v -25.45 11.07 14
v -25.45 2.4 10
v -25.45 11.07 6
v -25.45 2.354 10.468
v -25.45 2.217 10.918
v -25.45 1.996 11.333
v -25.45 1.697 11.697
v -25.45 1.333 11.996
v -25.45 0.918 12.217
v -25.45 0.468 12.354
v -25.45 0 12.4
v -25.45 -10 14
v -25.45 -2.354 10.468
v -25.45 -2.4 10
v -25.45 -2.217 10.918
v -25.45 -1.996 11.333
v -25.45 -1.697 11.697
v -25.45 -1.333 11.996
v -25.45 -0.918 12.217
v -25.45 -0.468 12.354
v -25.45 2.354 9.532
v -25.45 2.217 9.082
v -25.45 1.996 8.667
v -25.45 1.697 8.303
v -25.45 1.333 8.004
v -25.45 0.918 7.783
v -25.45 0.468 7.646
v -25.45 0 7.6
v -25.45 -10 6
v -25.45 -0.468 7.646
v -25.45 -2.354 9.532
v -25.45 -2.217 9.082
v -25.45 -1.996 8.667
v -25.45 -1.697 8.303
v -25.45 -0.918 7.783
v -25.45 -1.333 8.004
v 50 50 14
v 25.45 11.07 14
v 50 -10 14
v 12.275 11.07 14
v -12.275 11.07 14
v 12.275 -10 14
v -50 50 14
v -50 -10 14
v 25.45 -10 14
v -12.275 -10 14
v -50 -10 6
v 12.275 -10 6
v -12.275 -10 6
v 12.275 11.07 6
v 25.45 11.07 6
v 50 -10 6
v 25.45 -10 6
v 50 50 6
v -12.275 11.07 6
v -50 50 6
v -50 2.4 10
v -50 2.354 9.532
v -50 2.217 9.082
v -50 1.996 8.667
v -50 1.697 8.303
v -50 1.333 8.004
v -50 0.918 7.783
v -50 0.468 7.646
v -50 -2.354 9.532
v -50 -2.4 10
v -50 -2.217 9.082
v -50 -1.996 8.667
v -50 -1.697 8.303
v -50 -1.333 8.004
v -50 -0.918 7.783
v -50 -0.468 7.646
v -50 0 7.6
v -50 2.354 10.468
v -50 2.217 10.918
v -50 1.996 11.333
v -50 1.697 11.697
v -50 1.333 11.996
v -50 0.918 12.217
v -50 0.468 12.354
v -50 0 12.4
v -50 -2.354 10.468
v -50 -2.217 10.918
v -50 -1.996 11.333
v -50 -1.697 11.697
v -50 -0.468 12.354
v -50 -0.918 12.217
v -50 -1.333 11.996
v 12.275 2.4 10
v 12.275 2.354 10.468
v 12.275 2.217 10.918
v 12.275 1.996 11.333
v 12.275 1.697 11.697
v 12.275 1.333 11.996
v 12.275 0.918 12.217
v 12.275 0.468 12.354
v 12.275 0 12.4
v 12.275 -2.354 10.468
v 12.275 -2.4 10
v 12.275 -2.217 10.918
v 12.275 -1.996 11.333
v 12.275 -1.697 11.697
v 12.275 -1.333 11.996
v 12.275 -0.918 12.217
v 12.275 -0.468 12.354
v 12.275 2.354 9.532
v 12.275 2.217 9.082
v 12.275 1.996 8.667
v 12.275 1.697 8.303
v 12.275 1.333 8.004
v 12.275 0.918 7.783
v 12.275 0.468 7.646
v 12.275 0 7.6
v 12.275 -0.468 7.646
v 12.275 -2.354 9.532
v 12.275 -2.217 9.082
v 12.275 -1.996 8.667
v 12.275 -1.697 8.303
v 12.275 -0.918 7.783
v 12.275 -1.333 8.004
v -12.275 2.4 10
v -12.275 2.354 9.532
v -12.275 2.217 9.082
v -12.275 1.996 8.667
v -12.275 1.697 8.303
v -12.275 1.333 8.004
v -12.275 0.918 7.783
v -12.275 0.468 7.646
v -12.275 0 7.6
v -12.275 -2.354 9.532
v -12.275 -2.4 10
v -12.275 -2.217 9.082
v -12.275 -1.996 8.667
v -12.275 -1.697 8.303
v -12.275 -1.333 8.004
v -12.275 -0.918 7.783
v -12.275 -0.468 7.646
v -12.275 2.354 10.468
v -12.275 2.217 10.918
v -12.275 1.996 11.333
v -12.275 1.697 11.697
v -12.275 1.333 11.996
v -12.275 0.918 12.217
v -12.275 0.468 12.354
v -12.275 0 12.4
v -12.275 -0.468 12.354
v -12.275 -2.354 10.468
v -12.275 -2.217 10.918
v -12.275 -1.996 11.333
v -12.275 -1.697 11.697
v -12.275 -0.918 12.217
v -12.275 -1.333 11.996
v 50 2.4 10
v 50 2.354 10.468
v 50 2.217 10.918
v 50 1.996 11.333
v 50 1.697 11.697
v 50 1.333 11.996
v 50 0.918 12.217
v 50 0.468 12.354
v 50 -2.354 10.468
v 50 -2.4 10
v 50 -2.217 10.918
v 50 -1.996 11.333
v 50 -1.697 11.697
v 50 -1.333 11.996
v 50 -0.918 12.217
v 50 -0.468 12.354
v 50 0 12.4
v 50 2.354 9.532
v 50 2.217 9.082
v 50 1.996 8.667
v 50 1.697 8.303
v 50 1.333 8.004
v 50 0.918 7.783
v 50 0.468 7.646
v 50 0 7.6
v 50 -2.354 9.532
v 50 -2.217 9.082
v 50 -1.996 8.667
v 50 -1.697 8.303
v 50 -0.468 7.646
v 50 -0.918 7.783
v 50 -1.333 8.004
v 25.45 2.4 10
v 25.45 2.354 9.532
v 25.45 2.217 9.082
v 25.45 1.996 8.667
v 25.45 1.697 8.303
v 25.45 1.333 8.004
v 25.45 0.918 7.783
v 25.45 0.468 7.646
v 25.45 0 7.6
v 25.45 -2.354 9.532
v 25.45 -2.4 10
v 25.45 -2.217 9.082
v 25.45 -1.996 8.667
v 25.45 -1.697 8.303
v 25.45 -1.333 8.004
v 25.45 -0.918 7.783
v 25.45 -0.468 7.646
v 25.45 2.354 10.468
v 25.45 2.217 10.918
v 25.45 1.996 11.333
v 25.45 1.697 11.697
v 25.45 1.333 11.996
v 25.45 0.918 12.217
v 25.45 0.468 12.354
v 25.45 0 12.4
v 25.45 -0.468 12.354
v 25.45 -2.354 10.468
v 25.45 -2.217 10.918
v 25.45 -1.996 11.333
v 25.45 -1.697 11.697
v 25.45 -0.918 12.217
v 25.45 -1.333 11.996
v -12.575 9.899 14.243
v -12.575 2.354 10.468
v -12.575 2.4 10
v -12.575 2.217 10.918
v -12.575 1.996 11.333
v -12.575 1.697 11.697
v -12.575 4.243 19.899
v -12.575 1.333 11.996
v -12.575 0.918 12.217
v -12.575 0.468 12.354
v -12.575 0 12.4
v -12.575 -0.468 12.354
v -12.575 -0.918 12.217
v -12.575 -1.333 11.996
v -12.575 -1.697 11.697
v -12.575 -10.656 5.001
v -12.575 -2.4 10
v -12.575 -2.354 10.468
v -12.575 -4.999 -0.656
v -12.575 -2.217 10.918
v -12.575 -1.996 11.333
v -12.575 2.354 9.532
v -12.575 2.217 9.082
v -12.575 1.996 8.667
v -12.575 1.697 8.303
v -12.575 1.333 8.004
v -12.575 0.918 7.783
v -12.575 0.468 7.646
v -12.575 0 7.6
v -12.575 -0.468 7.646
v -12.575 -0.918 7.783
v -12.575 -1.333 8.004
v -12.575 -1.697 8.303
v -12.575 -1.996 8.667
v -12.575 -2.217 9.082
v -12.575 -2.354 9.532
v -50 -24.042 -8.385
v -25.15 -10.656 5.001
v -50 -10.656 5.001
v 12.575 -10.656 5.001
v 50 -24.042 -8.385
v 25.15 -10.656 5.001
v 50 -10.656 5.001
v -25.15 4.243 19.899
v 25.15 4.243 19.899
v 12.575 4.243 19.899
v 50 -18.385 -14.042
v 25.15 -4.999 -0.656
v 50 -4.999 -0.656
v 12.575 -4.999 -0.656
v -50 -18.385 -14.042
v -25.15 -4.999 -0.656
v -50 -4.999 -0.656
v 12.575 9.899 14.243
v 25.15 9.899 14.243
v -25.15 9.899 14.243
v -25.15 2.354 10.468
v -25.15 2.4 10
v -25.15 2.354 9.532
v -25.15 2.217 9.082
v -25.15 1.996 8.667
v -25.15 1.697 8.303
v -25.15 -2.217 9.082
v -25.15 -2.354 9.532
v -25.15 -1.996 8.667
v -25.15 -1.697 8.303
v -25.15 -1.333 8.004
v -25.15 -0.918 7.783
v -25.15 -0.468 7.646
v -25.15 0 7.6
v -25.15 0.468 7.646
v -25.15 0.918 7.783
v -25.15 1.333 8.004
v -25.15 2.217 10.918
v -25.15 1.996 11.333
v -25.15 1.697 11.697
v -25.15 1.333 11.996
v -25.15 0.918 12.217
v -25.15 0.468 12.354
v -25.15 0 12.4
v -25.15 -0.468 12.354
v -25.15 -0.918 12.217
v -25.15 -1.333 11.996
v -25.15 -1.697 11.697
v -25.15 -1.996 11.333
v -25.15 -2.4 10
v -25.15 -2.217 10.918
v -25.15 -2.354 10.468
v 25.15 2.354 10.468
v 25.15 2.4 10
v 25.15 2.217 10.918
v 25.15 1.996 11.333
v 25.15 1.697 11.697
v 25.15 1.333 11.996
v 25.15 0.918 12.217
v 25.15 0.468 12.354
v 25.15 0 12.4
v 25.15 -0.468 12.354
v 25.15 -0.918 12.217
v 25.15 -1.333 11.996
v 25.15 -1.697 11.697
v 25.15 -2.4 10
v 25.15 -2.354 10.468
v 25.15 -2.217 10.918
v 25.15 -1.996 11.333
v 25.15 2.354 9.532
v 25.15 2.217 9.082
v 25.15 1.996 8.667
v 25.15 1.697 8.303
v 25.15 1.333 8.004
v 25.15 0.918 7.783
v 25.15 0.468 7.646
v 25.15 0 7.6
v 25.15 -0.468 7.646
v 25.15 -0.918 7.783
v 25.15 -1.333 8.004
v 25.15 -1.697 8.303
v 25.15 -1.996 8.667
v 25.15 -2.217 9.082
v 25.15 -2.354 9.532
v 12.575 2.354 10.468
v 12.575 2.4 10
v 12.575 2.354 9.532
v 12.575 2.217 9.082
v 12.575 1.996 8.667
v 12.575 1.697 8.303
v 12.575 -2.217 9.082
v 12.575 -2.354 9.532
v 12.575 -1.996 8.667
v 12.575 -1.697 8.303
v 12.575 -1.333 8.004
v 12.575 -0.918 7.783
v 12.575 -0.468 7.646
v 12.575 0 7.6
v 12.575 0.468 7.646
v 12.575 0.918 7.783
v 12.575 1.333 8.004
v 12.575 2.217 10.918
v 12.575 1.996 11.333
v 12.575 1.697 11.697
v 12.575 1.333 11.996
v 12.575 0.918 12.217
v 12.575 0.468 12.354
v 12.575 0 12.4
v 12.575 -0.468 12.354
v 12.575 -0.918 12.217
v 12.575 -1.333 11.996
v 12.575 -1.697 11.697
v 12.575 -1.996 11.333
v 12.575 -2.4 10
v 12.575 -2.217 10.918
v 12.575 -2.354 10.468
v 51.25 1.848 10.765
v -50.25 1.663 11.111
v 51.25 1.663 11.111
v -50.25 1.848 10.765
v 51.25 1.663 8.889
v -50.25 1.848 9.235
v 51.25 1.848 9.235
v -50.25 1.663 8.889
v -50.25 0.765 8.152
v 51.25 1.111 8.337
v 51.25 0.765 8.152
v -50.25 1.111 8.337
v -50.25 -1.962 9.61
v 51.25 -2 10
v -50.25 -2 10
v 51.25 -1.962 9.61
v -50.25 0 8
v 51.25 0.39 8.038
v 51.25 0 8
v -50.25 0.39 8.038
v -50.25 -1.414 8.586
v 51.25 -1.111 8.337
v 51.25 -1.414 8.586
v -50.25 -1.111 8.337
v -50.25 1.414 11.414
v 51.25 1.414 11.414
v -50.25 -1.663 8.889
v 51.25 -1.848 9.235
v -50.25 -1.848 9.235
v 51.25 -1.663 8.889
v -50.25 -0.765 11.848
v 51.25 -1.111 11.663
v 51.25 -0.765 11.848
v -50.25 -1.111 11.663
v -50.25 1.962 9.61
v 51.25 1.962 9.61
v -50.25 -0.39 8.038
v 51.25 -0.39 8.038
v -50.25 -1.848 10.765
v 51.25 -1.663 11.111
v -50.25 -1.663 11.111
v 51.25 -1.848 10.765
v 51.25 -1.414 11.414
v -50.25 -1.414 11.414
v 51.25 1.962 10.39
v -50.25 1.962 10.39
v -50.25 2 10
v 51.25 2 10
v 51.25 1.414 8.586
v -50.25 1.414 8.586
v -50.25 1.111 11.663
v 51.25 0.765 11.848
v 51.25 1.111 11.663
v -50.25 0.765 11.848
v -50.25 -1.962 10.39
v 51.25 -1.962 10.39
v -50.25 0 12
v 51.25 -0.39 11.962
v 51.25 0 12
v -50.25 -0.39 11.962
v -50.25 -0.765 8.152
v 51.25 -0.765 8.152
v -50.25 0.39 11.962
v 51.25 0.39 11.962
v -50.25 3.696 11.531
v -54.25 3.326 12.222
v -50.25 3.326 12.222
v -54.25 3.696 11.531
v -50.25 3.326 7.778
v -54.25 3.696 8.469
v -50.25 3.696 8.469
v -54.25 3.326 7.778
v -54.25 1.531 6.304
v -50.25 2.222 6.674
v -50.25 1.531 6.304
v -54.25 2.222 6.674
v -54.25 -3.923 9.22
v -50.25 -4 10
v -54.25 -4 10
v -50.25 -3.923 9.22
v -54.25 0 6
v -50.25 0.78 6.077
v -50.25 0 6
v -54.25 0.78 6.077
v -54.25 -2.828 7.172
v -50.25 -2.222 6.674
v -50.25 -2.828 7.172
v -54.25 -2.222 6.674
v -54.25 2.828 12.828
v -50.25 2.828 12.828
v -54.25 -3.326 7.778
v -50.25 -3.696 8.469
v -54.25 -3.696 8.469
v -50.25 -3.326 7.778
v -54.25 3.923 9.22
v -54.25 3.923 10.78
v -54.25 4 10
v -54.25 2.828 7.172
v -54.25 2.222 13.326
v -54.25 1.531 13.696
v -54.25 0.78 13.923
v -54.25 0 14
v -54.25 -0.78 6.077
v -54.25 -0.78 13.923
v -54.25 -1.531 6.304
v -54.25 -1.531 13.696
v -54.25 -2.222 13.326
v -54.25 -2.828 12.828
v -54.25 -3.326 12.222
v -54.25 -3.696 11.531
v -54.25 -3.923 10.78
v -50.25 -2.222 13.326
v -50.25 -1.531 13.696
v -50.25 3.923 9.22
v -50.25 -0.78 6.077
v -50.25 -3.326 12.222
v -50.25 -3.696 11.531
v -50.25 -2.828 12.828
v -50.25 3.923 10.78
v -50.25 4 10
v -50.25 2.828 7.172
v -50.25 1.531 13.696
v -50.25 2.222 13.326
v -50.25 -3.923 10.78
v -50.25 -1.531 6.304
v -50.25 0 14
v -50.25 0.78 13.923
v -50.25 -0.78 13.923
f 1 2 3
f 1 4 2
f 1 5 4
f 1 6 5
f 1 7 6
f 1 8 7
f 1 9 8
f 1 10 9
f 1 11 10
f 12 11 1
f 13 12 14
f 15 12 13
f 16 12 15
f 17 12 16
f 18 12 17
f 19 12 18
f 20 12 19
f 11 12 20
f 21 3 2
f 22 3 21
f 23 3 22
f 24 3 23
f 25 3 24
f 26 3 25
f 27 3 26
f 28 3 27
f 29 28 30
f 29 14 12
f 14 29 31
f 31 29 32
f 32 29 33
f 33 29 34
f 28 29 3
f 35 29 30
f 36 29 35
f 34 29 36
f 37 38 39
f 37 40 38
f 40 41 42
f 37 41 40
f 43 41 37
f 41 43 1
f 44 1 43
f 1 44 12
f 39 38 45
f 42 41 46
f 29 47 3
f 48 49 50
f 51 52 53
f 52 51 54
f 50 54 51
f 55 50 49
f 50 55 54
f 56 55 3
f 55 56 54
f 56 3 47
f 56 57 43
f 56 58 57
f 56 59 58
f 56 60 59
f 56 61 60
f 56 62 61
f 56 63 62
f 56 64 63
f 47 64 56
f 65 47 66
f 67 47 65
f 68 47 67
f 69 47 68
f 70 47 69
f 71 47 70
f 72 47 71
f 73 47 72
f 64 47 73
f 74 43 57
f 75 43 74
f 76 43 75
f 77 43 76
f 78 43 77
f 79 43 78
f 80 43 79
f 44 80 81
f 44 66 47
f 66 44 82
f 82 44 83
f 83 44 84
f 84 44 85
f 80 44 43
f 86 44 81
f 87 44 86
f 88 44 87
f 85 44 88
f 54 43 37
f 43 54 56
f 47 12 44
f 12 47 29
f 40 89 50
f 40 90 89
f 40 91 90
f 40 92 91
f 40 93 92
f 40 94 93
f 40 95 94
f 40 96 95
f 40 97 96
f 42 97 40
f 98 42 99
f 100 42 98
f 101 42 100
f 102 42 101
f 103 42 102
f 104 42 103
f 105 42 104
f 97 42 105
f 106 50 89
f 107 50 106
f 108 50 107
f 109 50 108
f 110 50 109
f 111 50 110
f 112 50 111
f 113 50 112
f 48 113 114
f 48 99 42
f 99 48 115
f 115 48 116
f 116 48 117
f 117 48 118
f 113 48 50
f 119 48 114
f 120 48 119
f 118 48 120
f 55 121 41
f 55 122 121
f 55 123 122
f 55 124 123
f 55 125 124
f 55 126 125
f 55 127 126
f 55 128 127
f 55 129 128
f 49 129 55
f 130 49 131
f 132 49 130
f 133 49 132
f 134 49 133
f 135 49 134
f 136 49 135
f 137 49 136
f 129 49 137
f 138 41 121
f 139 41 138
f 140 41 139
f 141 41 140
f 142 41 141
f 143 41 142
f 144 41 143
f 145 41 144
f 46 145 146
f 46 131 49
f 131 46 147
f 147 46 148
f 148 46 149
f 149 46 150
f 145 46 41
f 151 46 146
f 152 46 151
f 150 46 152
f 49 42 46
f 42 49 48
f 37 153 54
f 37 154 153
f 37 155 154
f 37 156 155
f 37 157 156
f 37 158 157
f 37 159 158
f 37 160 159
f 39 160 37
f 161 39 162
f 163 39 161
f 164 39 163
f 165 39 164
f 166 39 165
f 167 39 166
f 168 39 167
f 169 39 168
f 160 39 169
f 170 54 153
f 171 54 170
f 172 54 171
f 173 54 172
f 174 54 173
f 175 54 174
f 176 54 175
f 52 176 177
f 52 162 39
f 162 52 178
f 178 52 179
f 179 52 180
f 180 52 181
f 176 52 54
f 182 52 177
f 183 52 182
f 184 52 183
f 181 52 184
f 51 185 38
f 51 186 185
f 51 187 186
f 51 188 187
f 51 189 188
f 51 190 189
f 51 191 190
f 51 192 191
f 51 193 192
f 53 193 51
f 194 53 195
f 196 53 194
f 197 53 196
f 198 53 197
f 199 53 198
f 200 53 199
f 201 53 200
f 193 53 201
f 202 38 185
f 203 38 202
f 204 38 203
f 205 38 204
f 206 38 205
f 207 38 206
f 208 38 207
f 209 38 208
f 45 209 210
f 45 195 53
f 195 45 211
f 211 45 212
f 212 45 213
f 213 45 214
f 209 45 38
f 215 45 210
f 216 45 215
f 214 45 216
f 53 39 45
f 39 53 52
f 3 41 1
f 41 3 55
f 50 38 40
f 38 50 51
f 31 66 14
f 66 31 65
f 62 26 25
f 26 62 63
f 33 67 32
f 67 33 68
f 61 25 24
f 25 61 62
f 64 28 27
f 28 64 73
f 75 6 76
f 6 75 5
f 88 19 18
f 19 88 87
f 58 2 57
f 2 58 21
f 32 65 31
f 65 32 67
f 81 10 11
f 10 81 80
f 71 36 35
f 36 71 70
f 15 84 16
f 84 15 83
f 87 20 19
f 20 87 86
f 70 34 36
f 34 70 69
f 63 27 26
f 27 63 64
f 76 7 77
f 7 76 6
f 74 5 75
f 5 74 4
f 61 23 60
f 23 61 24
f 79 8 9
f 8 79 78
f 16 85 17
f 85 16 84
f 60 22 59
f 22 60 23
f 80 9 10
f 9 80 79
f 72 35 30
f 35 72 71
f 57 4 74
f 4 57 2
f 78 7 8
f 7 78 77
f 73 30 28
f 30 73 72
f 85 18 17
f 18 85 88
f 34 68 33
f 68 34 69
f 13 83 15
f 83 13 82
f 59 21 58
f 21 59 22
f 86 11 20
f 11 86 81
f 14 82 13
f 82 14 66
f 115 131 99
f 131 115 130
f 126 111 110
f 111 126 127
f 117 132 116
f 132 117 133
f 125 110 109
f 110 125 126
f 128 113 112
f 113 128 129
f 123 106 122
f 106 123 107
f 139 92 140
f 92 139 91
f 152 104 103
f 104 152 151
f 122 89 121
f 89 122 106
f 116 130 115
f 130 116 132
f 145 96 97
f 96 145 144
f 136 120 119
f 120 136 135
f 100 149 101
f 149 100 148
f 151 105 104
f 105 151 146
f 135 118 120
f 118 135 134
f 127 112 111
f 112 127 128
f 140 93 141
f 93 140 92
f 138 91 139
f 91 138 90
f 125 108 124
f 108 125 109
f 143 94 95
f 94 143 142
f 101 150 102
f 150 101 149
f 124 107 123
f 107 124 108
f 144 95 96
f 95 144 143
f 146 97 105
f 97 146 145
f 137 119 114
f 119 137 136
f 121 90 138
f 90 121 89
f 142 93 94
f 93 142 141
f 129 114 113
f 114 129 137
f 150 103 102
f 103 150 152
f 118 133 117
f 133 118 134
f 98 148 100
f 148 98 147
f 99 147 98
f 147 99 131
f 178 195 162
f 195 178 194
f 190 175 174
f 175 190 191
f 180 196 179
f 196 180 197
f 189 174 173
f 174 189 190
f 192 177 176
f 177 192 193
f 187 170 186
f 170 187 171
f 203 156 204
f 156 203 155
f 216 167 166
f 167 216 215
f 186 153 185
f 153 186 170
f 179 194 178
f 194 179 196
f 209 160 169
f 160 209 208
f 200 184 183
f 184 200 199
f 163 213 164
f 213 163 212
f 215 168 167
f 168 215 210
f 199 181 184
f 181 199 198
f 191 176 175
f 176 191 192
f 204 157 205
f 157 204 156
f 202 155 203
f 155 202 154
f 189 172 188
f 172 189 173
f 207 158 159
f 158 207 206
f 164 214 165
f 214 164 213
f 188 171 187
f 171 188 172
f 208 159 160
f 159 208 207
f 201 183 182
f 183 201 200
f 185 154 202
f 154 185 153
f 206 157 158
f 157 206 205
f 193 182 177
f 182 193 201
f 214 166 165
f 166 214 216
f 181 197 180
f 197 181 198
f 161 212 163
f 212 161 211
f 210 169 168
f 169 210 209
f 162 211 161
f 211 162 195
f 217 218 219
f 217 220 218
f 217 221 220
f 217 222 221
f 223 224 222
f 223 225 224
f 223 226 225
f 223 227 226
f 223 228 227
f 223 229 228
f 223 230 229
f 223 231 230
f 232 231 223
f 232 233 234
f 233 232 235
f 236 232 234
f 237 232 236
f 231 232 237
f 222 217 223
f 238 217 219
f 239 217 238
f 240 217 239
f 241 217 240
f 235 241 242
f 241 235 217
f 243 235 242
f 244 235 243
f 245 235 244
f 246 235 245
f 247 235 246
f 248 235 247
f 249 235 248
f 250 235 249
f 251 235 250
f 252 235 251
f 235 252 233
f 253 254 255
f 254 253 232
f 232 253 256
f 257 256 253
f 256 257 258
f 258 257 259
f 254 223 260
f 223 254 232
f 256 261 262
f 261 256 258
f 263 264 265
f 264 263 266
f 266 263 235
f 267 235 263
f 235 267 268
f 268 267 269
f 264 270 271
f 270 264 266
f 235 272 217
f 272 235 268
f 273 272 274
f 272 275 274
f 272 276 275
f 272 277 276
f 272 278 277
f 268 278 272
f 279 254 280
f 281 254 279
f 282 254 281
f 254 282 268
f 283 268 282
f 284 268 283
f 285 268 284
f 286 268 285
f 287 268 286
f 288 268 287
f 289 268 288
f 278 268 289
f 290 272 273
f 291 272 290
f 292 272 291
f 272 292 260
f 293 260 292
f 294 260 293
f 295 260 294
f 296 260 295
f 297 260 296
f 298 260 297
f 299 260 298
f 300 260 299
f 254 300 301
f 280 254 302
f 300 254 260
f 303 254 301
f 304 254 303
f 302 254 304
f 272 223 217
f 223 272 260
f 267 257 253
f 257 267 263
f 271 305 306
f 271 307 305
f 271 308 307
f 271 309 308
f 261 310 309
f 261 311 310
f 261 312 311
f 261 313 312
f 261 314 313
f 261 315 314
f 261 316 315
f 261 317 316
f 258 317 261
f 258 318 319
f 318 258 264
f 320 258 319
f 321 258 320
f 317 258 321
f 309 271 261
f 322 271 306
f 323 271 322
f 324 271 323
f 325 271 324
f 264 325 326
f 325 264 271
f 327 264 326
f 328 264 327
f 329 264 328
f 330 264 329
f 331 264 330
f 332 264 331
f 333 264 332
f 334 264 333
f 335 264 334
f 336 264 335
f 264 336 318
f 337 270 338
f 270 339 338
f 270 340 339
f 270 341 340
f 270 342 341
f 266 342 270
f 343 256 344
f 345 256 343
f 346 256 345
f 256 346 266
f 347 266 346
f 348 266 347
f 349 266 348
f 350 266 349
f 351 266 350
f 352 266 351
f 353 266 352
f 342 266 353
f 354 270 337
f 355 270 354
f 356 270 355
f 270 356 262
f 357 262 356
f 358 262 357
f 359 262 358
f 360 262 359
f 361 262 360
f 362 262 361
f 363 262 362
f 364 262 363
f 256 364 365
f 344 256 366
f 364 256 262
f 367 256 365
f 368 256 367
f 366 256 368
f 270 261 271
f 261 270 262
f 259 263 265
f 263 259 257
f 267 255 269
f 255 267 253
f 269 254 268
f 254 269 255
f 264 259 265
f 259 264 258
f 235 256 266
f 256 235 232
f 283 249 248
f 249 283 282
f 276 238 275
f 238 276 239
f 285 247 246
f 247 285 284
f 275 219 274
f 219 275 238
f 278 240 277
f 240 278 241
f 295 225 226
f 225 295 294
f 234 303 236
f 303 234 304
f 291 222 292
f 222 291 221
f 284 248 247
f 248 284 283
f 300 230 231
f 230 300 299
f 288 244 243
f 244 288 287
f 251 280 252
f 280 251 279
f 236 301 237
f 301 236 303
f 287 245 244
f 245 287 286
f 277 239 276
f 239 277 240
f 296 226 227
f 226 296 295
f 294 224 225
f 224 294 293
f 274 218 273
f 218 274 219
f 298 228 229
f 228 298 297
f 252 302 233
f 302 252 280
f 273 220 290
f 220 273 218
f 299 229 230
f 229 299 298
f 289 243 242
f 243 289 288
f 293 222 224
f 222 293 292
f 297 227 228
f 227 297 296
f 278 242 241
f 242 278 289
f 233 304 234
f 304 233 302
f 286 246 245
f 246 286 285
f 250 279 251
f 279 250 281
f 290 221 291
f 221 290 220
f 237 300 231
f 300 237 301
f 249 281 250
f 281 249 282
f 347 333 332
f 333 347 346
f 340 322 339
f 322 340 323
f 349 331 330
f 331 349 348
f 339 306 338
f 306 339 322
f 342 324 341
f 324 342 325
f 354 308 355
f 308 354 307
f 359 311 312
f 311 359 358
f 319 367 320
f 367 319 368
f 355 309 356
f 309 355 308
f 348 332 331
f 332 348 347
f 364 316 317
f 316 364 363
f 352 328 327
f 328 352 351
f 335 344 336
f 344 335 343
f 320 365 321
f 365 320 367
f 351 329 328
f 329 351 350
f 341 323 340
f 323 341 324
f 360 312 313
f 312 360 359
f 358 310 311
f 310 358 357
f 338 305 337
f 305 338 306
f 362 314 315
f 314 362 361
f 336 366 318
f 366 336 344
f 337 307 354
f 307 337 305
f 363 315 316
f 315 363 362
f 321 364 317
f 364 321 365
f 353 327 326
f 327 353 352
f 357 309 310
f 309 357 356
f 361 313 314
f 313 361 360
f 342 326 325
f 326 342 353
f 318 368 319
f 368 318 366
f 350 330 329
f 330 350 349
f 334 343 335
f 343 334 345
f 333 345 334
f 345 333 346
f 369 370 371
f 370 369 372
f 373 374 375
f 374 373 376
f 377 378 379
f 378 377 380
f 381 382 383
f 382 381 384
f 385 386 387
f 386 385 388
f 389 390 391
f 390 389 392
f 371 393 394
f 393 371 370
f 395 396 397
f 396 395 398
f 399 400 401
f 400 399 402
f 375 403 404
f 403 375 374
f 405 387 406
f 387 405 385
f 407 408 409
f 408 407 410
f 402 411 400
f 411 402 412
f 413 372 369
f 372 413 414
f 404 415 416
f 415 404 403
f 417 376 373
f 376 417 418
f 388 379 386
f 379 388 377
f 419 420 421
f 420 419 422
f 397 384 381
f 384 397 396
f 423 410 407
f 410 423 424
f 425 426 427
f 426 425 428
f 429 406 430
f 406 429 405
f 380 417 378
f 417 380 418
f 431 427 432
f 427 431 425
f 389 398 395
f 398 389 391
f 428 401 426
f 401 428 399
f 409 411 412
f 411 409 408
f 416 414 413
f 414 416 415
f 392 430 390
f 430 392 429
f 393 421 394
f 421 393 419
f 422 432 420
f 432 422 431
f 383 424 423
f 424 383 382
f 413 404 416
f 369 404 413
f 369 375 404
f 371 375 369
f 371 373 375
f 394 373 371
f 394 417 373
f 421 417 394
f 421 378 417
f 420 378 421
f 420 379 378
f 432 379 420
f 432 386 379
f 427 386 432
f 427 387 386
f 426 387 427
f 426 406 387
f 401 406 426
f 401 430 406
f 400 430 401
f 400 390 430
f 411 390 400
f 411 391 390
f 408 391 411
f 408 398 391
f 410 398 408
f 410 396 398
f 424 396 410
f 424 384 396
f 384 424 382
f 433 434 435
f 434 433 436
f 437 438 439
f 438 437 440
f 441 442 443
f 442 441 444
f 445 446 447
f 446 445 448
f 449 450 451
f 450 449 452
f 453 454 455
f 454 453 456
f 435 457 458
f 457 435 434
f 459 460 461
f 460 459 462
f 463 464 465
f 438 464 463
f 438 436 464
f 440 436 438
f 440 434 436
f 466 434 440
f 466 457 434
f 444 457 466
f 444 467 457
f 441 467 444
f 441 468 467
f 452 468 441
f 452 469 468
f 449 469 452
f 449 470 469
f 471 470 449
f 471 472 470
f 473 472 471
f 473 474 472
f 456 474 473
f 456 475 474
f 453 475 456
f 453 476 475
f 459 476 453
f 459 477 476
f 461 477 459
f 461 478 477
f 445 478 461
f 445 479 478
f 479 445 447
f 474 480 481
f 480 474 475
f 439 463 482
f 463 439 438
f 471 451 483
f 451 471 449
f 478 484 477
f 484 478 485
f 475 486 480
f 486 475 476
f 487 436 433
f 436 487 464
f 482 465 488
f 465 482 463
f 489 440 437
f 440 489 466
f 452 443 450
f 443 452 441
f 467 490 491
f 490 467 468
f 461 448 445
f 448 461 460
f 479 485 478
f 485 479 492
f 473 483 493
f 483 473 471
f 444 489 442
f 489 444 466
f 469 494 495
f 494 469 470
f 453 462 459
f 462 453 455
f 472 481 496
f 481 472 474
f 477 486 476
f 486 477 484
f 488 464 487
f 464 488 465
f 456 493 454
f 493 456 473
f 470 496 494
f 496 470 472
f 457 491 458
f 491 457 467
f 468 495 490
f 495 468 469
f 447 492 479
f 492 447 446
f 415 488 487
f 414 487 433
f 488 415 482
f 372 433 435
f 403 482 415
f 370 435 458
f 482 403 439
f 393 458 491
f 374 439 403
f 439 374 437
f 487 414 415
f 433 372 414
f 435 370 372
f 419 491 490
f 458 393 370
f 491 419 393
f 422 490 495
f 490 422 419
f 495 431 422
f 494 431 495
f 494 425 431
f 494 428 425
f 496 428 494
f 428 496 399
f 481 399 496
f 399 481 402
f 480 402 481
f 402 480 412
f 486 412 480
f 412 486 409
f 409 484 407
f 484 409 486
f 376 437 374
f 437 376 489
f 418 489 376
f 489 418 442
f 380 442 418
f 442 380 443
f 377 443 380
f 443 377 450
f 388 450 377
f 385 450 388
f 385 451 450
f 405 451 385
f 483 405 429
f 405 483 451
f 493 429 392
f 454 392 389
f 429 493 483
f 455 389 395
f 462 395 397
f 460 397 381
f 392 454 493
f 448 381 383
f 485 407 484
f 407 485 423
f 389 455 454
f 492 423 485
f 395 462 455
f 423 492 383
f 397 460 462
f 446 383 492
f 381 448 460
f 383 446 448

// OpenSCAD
$fn = 32;

// ------------------------------------------------------------------------
// Butt hinge: hinge 100 mm, leaf swung 45 deg
// Every part is its own module, assembly() places every instance.
// ------------------------------------------------------------------------

// --- part 1 ---
module hinge_base() {
  difference() {
    union() {
      translate([-50, -10, -4]) cube([24.55, 60, 8]);
      translate([-12.275, -10, -4]) cube([24.55, 60, 8]);
      translate([25.45, -10, -4]) cube([24.55, 60, 8]);
      translate([-50, 11.07, -4]) cube([100, 38.93, 8]);
    }
    translate([-37.725, 0, 0]) rotate([0, 90, 0]) cylinder(h = 26.55, d = 4.8, center = true);
    translate([0, 0, 0]) rotate([0, 90, 0]) cylinder(h = 26.55, d = 4.8, center = true);
    translate([37.725, 0, 0]) rotate([0, 90, 0]) cylinder(h = 26.55, d = 4.8, center = true);
  }
}

// --- part 2 ---
module hinge_mover() {
  difference() {
    union() {
      translate([-25.15, -30, -4]) cube([12.575, 40, 8]);
      translate([12.575, -30, -4]) cube([12.575, 40, 8]);
      translate([-50, -30, -4]) cube([100, 18.93, 8]);
    }
    translate([-18.863, 0, 0]) rotate([0, 90, 0]) cylinder(h = 14.575, d = 4.8, center = true);
    translate([18.863, 0, 0]) rotate([0, 90, 0]) cylinder(h = 14.575, d = 4.8, center = true);
  }
}

// --- part 3 ---
module hinge_pin() {
  rotate([0, 90, 0]) cylinder(h = 102.5, d = 4, center = true);
  translate([-54.25, 0, 0]) rotate([0, 90, 0]) cylinder(h = 4, d = 8);
}

// --- assembly ---
module assembly() {
  color([0.80, 0.24, 0.20]) translate([0, 0, 10]) rotate([0, 0, 0]) hinge_base();
  color([0.20, 0.45, 0.75]) translate([0, 0, 10]) rotate([45, 0, 0]) hinge_mover();
  color([0.25, 0.62, 0.32]) translate([0, 0, 10]) rotate([0, 0, 0]) hinge_pin();
}

assembly();
